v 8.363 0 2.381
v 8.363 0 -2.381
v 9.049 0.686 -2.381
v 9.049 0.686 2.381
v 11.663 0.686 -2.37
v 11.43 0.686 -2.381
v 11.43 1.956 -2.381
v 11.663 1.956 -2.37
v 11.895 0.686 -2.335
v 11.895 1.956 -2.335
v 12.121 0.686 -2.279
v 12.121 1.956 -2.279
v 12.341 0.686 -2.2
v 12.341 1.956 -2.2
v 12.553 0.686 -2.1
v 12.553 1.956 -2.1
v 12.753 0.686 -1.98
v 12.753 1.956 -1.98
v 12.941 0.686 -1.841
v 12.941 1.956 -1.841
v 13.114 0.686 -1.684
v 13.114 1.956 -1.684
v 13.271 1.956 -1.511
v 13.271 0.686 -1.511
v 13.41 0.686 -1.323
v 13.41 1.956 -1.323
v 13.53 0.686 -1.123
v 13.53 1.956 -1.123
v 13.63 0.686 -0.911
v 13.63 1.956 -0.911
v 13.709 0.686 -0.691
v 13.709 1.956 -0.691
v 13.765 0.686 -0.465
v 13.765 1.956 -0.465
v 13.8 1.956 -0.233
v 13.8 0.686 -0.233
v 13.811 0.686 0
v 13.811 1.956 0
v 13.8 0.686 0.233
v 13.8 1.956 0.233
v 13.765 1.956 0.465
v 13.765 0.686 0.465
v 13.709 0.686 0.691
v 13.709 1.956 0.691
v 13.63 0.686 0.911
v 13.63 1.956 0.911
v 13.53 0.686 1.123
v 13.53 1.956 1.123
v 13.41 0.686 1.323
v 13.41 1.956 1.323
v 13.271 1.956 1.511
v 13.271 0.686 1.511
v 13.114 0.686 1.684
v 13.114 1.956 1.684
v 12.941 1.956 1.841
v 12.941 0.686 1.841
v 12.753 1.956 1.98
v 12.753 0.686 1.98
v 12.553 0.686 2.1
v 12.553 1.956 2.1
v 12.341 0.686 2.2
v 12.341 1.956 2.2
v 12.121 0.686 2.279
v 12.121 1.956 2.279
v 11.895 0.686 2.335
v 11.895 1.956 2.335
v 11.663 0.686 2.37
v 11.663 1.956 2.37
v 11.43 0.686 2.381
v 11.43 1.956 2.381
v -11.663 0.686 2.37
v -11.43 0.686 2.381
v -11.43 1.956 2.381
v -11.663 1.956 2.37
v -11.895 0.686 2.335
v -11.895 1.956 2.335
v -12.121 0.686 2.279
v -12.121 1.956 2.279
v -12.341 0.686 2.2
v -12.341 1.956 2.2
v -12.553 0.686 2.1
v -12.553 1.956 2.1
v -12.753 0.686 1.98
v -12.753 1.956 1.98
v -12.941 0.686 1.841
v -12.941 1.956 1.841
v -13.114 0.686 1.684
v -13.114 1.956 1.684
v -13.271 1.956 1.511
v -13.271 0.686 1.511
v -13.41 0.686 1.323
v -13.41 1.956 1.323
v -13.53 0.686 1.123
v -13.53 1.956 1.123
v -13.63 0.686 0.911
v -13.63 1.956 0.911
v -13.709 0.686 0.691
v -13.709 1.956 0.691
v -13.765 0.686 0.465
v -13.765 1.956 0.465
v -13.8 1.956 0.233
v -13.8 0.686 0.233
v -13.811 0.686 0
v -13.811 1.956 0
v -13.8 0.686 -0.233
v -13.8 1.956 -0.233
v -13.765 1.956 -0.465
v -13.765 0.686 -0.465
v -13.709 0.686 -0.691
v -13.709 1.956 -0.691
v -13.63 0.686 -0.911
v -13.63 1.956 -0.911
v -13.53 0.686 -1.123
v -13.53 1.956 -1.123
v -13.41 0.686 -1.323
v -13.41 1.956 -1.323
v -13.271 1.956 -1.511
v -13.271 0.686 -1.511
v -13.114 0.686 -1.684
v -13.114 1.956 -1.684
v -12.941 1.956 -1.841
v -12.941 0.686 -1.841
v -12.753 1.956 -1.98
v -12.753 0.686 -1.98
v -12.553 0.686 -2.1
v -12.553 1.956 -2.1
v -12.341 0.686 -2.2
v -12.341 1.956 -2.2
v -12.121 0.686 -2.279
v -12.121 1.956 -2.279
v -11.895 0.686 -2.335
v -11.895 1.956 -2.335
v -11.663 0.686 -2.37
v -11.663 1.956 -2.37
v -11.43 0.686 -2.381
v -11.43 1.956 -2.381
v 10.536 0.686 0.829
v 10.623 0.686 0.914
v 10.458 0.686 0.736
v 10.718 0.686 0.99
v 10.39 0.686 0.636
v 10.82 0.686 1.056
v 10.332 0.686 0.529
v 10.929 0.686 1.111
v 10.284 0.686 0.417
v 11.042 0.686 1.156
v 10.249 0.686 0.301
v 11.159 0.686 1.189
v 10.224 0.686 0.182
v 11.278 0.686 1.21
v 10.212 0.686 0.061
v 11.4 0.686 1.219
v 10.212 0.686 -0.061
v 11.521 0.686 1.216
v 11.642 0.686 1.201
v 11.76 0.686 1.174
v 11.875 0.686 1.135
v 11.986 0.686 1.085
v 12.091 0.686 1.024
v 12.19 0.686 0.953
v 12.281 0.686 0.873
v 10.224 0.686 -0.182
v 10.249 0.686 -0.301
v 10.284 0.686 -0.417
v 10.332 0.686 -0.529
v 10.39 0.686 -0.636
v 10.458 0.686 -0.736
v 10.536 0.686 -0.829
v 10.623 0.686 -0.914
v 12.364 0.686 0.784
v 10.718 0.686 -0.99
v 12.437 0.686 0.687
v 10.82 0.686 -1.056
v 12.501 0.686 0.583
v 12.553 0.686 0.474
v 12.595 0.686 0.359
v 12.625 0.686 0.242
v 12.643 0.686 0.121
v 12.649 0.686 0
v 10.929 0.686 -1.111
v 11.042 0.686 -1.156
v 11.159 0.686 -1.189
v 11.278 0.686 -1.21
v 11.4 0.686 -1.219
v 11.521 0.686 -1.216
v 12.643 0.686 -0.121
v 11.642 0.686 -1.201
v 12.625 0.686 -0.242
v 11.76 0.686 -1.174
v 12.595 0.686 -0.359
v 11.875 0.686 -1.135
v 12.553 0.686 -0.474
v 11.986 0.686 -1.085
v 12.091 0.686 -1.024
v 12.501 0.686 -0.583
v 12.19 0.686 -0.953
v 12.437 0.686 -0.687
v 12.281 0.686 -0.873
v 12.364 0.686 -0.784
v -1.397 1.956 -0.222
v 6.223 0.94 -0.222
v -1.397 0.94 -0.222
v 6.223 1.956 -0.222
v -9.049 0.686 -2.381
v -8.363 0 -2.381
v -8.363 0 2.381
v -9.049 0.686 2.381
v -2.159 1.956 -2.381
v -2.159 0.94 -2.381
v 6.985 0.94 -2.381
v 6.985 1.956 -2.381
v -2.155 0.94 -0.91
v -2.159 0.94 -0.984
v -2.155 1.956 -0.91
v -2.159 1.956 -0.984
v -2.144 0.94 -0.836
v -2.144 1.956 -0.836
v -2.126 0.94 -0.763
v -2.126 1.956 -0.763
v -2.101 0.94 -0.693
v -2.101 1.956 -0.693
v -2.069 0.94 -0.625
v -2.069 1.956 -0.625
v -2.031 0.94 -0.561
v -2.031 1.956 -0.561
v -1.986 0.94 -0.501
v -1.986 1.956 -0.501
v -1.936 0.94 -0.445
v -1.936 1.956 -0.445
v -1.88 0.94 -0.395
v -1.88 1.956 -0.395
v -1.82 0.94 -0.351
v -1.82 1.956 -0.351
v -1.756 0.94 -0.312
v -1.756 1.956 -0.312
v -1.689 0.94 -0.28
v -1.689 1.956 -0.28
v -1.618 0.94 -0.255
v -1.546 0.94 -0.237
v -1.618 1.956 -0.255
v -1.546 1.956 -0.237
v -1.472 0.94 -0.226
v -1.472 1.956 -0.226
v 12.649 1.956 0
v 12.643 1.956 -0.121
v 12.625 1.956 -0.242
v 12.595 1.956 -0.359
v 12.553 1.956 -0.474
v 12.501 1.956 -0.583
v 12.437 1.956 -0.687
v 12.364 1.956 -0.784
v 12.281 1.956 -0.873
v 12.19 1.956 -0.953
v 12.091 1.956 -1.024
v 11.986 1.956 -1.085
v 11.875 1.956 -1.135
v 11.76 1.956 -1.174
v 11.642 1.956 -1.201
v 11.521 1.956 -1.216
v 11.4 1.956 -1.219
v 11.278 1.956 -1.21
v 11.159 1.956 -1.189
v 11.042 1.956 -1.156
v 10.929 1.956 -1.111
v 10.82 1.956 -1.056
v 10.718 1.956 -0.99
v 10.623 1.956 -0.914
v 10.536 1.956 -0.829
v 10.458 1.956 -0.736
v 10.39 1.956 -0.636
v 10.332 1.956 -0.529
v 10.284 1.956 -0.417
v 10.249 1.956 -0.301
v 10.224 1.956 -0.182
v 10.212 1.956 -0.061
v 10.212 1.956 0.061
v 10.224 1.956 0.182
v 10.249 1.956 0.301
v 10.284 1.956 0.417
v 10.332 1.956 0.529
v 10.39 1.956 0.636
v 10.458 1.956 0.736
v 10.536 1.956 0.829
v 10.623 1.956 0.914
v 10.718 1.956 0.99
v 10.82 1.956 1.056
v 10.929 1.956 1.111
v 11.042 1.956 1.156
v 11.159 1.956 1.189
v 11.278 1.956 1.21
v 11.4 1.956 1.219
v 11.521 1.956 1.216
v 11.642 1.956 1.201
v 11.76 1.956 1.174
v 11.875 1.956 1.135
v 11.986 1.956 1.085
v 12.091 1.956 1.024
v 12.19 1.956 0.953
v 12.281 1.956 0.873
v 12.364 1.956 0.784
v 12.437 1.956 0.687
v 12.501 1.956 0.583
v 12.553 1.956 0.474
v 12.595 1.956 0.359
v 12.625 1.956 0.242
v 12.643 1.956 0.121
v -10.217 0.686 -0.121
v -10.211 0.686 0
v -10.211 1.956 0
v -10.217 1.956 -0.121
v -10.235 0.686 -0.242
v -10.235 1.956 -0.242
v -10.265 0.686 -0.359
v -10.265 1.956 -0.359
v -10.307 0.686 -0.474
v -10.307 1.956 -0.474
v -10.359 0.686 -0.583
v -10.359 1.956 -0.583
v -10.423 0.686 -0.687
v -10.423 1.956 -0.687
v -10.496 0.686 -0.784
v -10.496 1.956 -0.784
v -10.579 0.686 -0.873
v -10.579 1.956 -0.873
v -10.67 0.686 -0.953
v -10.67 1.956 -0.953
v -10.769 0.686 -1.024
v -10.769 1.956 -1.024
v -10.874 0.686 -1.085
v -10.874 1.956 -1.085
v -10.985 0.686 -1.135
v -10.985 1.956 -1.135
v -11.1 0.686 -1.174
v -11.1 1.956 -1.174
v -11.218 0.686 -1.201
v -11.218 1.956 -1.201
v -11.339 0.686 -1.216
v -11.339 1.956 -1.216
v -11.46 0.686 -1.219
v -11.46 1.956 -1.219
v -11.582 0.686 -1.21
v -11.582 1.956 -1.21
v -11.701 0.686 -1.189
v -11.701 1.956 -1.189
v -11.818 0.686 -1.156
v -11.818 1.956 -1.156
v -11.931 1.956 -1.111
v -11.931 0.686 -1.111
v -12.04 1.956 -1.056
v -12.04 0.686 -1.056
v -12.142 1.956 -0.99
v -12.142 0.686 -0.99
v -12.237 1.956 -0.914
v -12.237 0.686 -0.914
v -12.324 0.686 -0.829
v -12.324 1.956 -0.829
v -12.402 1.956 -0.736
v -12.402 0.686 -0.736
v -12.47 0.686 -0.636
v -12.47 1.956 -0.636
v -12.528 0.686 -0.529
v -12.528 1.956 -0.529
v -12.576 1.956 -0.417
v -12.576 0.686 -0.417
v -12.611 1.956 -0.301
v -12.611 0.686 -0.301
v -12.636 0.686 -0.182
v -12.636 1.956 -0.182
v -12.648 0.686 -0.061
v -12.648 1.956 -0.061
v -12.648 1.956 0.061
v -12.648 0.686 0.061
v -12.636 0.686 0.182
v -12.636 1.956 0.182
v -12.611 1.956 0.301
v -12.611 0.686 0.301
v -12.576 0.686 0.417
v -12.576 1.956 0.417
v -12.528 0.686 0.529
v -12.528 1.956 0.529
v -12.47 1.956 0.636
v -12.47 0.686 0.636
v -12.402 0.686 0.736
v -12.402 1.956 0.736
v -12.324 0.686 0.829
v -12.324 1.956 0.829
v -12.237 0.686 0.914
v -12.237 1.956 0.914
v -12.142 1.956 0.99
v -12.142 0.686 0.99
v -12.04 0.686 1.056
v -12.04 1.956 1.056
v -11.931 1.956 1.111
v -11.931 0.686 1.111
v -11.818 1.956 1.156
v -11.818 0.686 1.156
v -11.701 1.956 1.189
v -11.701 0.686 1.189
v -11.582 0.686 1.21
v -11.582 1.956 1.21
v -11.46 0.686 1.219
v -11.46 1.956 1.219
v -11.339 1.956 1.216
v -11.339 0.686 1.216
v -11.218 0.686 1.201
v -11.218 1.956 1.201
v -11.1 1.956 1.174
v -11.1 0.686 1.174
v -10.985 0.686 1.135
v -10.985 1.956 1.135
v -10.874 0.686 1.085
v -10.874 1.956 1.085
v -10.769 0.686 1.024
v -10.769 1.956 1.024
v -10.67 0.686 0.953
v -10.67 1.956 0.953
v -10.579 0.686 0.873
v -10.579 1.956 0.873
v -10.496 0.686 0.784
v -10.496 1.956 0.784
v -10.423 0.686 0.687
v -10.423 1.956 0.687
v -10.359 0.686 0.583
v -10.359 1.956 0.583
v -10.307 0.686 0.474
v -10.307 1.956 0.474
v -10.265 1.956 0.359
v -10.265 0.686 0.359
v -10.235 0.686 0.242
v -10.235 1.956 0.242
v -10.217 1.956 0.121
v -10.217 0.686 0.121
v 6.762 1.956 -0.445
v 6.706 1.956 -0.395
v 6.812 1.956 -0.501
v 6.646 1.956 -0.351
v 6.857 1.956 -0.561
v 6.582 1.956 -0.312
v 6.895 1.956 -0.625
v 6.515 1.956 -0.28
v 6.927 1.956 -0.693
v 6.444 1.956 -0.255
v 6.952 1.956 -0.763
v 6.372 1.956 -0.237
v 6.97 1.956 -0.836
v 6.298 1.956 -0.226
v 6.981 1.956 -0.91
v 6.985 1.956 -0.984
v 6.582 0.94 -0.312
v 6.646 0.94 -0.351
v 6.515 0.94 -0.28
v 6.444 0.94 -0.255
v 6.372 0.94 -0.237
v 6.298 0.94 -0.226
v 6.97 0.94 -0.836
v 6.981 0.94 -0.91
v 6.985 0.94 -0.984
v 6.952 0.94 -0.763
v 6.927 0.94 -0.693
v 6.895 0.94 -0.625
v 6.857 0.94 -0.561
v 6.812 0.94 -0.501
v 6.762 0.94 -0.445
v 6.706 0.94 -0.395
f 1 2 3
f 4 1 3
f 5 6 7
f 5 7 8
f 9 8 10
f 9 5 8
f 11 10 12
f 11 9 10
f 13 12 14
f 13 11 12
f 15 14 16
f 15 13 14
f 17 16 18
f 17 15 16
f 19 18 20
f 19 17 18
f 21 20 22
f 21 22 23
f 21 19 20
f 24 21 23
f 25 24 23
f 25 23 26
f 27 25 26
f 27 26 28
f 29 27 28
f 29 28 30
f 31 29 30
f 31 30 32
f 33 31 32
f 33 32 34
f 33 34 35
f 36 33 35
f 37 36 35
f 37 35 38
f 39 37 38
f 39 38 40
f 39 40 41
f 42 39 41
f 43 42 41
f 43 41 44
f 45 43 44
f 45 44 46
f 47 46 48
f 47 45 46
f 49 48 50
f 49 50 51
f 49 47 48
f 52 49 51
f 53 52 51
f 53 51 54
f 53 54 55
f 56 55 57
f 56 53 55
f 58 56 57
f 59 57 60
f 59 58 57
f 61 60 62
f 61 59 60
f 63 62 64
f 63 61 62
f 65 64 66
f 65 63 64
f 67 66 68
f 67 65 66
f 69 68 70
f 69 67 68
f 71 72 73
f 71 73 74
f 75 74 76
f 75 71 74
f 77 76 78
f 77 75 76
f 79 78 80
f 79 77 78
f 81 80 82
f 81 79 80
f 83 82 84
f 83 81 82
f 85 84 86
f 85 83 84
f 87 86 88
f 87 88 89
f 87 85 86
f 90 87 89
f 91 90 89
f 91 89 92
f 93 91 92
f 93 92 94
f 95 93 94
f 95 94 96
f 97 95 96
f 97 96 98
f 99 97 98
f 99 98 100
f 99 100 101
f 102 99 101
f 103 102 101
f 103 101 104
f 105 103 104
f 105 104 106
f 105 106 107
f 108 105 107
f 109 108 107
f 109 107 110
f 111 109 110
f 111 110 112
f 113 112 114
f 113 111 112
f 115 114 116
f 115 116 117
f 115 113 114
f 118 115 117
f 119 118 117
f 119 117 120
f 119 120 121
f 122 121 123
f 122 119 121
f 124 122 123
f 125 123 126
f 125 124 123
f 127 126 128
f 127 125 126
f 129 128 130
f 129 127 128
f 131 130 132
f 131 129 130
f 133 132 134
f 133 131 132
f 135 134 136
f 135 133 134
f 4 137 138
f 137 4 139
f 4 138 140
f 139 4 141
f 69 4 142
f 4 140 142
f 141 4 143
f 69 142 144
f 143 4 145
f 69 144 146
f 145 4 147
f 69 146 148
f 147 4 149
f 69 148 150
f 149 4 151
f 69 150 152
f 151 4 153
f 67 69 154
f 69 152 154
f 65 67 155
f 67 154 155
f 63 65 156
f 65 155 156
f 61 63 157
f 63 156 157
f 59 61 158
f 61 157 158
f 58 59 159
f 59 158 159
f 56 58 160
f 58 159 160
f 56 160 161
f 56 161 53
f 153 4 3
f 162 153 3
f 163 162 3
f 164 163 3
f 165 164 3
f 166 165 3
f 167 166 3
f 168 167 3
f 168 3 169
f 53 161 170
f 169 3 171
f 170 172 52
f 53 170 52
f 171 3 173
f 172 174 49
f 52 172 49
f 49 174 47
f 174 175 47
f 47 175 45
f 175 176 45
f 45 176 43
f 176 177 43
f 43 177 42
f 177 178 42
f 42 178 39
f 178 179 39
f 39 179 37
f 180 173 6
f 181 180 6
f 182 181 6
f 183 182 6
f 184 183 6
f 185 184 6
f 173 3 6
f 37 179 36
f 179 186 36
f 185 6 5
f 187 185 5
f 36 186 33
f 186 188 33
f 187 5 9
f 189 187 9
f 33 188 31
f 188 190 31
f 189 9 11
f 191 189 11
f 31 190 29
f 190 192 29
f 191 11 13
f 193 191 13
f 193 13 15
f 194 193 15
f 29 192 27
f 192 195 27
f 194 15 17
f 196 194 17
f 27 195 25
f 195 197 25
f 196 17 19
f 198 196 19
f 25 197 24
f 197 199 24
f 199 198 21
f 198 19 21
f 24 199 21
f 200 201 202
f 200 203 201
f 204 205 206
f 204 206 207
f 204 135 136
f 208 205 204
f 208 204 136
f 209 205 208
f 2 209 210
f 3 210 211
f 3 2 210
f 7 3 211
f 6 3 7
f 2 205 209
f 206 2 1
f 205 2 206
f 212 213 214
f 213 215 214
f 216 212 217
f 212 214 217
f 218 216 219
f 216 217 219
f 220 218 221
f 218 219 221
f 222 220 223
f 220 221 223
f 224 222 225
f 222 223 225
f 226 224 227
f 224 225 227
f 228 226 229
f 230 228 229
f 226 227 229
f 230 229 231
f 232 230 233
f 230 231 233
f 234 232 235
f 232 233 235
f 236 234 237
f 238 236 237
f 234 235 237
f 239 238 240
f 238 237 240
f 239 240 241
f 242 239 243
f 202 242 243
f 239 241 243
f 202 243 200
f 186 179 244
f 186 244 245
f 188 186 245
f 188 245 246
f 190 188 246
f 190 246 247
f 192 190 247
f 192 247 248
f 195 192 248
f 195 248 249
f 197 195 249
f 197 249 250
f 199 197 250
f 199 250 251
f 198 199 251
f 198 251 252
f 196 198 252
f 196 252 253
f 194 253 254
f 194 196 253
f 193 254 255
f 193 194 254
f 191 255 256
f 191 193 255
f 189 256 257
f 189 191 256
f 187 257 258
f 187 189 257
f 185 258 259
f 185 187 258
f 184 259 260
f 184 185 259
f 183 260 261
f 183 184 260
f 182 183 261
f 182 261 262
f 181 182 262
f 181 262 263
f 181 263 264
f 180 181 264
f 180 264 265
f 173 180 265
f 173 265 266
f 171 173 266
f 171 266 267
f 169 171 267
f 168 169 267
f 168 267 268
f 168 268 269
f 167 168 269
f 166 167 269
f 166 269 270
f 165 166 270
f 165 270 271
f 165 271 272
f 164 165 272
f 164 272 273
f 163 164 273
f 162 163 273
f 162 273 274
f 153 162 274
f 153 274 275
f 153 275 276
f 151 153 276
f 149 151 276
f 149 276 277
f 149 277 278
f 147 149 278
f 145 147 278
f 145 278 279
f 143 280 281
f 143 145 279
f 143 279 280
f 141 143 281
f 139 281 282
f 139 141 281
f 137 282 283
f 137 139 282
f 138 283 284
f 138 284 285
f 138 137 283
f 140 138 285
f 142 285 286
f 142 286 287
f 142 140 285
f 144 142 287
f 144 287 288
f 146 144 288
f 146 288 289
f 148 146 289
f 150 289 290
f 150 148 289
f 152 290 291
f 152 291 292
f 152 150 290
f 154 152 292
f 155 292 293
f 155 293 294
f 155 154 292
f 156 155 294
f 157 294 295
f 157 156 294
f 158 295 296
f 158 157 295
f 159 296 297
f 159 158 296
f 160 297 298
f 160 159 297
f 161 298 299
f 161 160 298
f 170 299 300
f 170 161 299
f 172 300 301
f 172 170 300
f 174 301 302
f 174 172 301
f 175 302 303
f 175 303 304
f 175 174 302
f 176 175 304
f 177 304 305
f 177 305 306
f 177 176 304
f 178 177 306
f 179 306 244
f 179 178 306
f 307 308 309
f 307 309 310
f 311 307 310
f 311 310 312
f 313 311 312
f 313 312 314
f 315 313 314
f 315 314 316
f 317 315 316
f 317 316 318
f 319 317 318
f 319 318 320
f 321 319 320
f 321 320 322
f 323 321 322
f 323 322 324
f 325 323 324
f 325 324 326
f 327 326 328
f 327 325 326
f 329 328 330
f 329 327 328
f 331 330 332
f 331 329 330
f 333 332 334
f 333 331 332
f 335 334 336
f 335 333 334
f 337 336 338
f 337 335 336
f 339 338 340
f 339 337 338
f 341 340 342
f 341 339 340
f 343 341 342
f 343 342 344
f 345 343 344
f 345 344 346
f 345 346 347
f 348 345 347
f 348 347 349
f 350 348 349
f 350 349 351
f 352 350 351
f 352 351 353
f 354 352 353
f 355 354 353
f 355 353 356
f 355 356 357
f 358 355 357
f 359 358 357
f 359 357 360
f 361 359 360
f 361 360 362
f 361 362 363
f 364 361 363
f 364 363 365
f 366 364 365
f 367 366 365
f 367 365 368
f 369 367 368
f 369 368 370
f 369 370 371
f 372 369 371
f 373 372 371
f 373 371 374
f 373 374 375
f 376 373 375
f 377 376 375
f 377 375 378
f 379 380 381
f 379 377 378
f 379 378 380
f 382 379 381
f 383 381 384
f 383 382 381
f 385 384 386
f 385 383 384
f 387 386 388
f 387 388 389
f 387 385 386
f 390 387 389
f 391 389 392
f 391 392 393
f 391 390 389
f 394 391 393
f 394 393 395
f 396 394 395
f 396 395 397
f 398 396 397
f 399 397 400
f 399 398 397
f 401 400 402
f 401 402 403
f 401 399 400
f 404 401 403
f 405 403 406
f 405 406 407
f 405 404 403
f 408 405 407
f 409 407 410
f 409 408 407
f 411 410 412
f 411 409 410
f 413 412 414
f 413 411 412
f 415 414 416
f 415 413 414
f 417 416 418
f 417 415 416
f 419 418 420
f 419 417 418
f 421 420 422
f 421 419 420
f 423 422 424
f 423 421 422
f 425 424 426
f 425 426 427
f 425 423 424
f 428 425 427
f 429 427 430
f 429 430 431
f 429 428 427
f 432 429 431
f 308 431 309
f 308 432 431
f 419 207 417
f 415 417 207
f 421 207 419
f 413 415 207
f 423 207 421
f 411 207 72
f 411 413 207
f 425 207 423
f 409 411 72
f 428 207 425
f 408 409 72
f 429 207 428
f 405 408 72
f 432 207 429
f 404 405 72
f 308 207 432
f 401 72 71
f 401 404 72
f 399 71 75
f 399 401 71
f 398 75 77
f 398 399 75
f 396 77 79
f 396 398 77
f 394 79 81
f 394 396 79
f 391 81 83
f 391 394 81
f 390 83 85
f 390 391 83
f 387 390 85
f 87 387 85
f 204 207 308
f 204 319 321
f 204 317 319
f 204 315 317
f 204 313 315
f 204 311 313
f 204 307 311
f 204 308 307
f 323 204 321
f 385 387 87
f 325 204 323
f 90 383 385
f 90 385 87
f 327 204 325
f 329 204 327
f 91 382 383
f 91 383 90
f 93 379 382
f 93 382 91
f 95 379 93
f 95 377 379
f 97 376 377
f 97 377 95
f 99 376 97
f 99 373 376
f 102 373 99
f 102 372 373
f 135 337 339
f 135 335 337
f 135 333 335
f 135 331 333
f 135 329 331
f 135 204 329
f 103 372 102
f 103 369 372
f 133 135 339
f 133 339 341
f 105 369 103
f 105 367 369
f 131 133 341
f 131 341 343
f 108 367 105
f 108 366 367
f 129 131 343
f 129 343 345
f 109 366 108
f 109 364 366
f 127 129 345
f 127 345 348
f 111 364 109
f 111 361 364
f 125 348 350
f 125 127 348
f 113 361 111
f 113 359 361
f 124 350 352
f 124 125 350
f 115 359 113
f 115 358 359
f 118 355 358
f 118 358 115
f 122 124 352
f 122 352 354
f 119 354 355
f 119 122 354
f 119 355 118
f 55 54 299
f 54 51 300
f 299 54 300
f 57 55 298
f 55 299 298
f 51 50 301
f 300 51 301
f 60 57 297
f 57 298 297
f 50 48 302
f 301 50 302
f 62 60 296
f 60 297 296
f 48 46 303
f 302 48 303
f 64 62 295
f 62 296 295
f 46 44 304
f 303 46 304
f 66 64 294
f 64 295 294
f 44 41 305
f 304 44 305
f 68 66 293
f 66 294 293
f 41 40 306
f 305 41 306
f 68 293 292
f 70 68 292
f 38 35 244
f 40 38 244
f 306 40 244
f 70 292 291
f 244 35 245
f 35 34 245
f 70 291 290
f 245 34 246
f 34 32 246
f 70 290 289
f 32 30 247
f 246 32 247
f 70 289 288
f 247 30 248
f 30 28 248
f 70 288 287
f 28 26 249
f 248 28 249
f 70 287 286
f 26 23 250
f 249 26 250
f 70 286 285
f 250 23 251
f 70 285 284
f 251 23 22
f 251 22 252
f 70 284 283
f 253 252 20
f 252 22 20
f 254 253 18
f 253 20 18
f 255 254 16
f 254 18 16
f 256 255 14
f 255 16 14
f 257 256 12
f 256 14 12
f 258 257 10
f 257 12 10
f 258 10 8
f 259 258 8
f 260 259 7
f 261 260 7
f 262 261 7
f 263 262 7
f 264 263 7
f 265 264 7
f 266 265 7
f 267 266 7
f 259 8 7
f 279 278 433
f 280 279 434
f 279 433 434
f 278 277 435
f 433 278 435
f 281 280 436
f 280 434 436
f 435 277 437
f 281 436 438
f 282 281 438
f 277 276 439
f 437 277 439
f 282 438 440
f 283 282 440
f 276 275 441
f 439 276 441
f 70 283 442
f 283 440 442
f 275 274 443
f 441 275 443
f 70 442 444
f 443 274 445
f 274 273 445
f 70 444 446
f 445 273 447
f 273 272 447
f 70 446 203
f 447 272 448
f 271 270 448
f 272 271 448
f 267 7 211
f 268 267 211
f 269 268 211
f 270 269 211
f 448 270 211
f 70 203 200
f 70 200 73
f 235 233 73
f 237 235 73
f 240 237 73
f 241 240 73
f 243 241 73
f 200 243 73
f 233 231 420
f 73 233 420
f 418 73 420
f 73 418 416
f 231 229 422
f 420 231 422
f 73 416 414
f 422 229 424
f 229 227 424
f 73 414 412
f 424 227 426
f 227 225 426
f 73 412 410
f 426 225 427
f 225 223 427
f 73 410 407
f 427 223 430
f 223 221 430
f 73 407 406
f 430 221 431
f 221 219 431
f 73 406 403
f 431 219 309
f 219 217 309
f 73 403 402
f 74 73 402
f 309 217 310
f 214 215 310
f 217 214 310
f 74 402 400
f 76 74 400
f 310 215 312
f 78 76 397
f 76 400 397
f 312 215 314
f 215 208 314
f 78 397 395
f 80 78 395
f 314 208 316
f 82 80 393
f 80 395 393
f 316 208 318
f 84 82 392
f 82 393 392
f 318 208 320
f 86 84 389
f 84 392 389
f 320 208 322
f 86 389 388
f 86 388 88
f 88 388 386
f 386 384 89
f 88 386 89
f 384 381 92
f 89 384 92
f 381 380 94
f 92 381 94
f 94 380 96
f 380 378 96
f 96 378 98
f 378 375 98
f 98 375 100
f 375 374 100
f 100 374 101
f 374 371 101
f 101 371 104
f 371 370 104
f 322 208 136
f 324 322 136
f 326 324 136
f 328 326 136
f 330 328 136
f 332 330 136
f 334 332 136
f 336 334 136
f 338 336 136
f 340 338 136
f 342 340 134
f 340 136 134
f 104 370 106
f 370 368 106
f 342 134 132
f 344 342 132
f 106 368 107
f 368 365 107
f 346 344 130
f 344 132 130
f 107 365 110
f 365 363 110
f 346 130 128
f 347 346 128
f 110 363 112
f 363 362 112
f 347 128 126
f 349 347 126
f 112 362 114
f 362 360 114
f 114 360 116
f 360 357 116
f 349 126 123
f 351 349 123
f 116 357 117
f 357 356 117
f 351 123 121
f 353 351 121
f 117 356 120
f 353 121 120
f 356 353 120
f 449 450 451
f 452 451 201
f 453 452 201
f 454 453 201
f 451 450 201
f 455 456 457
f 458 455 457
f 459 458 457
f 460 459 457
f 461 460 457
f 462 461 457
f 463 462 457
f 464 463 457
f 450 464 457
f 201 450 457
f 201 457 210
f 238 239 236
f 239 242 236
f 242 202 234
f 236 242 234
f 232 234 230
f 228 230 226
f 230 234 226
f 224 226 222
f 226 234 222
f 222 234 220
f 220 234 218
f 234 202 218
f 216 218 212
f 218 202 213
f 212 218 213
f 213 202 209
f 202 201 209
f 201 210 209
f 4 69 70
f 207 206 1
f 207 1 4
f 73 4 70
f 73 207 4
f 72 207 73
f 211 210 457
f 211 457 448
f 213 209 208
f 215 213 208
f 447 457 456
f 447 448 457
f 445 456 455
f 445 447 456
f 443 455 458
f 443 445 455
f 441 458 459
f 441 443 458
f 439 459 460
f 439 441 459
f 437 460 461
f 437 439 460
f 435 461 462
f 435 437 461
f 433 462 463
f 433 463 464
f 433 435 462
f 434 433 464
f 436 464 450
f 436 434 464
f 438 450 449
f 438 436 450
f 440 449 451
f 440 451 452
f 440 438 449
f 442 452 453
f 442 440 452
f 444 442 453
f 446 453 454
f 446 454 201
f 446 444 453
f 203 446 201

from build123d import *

# Parameters (mm, degrees)
SKETCH1_R           = 1.2192
BOSS_EXTRUDE1_DEPTH = 1.9558
SKETCH3_W           = 9.144
SKETCH3_H           = 1.016
CUT_EXTRUDE1_DEPTH  = 2.159
FILLET1_R           = 0.762
CUT_EXTRUDE2_DEPTH  = 5.7625


with BuildPart() as part:
    # Sketch1 → Boss-Extrude1 (new body)
    with BuildSketch(Plane(origin=(0, 0, 0), x_dir=(1, 0, 0), z_dir=(0, 1, 0))):
        with BuildLine():
            Line((-11.43, 2.38125), (11.43, 2.38125))
            ThreePointArc((11.43, 2.38125), (13.81125, 0), (11.43, -2.38125))
            Line((11.43, -2.38125), (-11.43, -2.38125))
            ThreePointArc((-11.43, -2.38125), (-13.81125, 0), (-11.43, 2.38125))
        make_face()
        with Locations((-11.43, 0)):
            Circle(SKETCH1_R, mode=Mode.SUBTRACT)
        with Locations((11.43, 0)):
            Circle(SKETCH1_R, mode=Mode.SUBTRACT)
    extrude(amount=BOSS_EXTRUDE1_DEPTH)

    # Sketch3 → Cut-Extrude1 (cut)
    with BuildSketch(Plane(origin=(0, 0, -2.38125), x_dir=(-1, 0, 0), z_dir=(0, 0, -1))):
        with Locations((-2.413, 1.4478)):
            Rectangle(SKETCH3_W, SKETCH3_H)
    extrude(amount=-CUT_EXTRUDE1_DEPTH, mode=Mode.SUBTRACT)

    # Fillet1
    fillet1_edges = [part.edges().sort_by_distance(p)[0] for p in [
        (6.985, 1.4478, -0.22225),
        (-2.159, 1.4478, -0.22225),
    ]]
    fillet(fillet1_edges, radius=FILLET1_R)

    # Sketch4 → Cut-Extrude2 (cut, through all)
    with BuildSketch(Plane(origin=(0, 0, -2.38125), x_dir=(-1, 0, 0), z_dir=(0, 0, -1))):
        Polygon((-8.36295, 0), (-9.04875, 0.6858), (-14.591138831, 0.6858), (-14.591138831, 0), align=None)
        Polygon((14.591138831, 0.6858), (14.591138831, 0), (8.36295, 0), (9.04875, 0.6858), align=None)
    extrude(amount=-CUT_EXTRUDE2_DEPTH, mode=Mode.SUBTRACT)


solid = part.part
